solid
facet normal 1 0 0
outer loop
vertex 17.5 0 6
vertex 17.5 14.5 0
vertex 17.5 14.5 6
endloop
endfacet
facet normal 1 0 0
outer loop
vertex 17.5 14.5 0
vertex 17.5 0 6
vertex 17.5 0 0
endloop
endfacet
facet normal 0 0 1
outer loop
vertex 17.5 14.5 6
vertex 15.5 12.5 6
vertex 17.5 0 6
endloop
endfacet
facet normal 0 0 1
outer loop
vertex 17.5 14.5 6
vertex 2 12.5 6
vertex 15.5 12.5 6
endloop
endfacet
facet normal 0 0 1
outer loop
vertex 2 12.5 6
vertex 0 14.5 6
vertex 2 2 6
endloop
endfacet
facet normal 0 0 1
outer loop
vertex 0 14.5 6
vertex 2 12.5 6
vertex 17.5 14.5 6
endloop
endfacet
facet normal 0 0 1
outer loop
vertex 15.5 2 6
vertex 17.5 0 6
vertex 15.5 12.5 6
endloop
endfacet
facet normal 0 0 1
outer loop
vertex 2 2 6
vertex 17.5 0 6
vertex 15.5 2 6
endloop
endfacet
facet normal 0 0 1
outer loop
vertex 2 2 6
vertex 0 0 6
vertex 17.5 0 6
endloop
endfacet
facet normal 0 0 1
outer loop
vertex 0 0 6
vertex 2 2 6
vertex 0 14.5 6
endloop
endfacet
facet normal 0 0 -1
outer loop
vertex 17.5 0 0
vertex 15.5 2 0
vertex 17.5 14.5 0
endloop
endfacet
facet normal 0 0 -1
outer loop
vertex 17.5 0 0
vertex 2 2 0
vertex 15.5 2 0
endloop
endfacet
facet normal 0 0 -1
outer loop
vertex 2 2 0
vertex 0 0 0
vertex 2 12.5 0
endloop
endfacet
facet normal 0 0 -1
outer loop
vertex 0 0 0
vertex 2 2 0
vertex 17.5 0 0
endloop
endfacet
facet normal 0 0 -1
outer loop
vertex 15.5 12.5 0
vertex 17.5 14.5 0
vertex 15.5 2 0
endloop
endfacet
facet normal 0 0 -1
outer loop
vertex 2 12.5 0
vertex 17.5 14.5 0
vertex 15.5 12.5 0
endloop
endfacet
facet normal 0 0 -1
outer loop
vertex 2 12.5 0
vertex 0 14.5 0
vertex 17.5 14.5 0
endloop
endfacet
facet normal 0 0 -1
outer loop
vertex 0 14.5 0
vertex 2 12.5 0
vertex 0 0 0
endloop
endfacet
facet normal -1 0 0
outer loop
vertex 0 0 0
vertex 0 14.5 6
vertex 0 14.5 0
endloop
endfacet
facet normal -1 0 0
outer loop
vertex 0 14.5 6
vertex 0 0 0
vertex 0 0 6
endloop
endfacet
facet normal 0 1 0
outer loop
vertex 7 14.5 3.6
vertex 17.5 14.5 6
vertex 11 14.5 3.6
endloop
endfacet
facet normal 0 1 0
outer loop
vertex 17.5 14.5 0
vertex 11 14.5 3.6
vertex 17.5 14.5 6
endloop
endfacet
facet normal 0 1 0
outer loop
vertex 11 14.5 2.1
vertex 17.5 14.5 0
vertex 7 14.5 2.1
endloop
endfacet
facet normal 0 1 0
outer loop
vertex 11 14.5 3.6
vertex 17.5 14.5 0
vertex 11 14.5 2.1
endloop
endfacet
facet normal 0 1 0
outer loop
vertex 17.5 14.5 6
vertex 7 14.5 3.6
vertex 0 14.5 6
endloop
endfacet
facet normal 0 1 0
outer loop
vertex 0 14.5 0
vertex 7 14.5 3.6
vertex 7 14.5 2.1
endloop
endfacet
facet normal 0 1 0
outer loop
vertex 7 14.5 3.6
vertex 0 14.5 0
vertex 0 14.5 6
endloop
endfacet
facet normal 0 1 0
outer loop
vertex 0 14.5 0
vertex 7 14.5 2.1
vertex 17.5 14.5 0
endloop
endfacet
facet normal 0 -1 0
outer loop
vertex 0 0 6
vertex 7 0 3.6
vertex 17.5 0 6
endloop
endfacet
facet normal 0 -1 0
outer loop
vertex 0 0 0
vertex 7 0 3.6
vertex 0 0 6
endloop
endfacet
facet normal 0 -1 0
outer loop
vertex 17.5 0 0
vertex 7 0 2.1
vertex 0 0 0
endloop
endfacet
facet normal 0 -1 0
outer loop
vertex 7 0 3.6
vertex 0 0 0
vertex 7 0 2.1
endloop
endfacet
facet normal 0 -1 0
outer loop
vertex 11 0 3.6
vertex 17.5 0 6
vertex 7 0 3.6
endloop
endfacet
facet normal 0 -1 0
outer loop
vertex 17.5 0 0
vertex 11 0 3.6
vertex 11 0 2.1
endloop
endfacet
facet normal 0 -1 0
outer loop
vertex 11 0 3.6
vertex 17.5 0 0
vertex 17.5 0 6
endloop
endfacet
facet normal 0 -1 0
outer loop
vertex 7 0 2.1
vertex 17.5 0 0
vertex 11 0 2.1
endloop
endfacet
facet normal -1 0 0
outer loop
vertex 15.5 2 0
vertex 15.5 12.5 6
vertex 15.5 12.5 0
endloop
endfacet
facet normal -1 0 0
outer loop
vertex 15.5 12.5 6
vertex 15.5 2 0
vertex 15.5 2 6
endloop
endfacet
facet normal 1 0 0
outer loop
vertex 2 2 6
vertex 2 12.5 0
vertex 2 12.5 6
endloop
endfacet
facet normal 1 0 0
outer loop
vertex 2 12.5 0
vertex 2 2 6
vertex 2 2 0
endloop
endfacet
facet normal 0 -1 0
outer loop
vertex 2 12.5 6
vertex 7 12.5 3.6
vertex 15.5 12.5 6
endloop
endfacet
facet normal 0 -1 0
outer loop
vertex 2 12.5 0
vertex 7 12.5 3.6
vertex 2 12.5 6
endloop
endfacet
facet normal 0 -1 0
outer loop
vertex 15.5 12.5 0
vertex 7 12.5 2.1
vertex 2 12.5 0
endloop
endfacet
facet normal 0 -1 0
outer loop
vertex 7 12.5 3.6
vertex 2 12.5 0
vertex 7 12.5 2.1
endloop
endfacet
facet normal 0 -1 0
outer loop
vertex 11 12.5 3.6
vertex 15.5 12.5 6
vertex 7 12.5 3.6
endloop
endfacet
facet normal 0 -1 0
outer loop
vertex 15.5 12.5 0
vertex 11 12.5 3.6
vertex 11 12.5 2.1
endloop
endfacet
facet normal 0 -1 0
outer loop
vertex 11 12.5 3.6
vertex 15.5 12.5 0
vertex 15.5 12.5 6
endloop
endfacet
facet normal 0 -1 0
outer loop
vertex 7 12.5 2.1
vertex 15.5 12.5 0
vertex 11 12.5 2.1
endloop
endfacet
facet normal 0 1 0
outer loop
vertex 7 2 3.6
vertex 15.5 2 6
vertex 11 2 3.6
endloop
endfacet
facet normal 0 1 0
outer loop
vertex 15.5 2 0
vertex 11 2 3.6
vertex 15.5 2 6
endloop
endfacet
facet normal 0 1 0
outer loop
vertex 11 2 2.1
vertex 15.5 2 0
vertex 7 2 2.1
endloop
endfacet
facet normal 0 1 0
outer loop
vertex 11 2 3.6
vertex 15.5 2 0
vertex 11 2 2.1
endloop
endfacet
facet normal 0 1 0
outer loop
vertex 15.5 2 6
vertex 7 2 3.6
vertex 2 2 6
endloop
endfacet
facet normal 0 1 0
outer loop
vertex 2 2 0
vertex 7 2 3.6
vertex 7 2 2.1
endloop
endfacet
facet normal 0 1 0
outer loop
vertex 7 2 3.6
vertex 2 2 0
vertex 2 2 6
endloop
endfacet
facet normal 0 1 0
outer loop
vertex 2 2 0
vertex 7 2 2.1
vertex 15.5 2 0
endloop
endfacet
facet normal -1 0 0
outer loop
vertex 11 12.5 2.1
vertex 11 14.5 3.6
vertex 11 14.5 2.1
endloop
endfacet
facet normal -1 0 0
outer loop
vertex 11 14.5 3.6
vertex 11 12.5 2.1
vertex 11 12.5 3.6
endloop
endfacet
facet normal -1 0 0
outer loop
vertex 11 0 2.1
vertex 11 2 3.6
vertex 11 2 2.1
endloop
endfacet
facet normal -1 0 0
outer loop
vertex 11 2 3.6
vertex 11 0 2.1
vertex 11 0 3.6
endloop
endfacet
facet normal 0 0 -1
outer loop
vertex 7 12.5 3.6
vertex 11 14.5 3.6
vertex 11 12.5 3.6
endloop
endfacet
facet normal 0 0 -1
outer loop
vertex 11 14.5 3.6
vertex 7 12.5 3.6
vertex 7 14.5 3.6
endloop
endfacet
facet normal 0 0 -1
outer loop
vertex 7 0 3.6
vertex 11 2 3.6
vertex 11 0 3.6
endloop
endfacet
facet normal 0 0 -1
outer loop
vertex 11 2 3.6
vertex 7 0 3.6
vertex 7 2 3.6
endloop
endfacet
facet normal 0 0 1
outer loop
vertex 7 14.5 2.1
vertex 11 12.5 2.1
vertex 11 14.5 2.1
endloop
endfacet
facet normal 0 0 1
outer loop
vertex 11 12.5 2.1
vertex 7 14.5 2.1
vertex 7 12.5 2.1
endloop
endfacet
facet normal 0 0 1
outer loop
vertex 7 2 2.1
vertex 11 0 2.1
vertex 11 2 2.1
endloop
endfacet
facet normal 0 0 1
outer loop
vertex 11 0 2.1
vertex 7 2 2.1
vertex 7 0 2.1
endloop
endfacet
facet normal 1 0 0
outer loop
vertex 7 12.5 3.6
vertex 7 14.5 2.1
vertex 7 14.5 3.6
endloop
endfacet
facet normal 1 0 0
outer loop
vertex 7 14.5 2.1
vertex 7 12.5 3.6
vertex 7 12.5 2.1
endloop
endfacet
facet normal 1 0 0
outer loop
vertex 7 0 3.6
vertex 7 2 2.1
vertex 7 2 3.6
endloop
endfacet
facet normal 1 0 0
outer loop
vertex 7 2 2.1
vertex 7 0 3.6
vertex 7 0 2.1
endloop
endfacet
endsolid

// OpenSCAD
//bezel to mount VL53L0x breakout board



difference(){
    Border();
    translate([7,0,2.1]) cube ([4,14.5,1.5]);
}    


module Border() {
    difference (){
        cube([17.5,14.5,6]);
        translate([2,2,0]) cube([13.5,10.5,6]);
    }
}
